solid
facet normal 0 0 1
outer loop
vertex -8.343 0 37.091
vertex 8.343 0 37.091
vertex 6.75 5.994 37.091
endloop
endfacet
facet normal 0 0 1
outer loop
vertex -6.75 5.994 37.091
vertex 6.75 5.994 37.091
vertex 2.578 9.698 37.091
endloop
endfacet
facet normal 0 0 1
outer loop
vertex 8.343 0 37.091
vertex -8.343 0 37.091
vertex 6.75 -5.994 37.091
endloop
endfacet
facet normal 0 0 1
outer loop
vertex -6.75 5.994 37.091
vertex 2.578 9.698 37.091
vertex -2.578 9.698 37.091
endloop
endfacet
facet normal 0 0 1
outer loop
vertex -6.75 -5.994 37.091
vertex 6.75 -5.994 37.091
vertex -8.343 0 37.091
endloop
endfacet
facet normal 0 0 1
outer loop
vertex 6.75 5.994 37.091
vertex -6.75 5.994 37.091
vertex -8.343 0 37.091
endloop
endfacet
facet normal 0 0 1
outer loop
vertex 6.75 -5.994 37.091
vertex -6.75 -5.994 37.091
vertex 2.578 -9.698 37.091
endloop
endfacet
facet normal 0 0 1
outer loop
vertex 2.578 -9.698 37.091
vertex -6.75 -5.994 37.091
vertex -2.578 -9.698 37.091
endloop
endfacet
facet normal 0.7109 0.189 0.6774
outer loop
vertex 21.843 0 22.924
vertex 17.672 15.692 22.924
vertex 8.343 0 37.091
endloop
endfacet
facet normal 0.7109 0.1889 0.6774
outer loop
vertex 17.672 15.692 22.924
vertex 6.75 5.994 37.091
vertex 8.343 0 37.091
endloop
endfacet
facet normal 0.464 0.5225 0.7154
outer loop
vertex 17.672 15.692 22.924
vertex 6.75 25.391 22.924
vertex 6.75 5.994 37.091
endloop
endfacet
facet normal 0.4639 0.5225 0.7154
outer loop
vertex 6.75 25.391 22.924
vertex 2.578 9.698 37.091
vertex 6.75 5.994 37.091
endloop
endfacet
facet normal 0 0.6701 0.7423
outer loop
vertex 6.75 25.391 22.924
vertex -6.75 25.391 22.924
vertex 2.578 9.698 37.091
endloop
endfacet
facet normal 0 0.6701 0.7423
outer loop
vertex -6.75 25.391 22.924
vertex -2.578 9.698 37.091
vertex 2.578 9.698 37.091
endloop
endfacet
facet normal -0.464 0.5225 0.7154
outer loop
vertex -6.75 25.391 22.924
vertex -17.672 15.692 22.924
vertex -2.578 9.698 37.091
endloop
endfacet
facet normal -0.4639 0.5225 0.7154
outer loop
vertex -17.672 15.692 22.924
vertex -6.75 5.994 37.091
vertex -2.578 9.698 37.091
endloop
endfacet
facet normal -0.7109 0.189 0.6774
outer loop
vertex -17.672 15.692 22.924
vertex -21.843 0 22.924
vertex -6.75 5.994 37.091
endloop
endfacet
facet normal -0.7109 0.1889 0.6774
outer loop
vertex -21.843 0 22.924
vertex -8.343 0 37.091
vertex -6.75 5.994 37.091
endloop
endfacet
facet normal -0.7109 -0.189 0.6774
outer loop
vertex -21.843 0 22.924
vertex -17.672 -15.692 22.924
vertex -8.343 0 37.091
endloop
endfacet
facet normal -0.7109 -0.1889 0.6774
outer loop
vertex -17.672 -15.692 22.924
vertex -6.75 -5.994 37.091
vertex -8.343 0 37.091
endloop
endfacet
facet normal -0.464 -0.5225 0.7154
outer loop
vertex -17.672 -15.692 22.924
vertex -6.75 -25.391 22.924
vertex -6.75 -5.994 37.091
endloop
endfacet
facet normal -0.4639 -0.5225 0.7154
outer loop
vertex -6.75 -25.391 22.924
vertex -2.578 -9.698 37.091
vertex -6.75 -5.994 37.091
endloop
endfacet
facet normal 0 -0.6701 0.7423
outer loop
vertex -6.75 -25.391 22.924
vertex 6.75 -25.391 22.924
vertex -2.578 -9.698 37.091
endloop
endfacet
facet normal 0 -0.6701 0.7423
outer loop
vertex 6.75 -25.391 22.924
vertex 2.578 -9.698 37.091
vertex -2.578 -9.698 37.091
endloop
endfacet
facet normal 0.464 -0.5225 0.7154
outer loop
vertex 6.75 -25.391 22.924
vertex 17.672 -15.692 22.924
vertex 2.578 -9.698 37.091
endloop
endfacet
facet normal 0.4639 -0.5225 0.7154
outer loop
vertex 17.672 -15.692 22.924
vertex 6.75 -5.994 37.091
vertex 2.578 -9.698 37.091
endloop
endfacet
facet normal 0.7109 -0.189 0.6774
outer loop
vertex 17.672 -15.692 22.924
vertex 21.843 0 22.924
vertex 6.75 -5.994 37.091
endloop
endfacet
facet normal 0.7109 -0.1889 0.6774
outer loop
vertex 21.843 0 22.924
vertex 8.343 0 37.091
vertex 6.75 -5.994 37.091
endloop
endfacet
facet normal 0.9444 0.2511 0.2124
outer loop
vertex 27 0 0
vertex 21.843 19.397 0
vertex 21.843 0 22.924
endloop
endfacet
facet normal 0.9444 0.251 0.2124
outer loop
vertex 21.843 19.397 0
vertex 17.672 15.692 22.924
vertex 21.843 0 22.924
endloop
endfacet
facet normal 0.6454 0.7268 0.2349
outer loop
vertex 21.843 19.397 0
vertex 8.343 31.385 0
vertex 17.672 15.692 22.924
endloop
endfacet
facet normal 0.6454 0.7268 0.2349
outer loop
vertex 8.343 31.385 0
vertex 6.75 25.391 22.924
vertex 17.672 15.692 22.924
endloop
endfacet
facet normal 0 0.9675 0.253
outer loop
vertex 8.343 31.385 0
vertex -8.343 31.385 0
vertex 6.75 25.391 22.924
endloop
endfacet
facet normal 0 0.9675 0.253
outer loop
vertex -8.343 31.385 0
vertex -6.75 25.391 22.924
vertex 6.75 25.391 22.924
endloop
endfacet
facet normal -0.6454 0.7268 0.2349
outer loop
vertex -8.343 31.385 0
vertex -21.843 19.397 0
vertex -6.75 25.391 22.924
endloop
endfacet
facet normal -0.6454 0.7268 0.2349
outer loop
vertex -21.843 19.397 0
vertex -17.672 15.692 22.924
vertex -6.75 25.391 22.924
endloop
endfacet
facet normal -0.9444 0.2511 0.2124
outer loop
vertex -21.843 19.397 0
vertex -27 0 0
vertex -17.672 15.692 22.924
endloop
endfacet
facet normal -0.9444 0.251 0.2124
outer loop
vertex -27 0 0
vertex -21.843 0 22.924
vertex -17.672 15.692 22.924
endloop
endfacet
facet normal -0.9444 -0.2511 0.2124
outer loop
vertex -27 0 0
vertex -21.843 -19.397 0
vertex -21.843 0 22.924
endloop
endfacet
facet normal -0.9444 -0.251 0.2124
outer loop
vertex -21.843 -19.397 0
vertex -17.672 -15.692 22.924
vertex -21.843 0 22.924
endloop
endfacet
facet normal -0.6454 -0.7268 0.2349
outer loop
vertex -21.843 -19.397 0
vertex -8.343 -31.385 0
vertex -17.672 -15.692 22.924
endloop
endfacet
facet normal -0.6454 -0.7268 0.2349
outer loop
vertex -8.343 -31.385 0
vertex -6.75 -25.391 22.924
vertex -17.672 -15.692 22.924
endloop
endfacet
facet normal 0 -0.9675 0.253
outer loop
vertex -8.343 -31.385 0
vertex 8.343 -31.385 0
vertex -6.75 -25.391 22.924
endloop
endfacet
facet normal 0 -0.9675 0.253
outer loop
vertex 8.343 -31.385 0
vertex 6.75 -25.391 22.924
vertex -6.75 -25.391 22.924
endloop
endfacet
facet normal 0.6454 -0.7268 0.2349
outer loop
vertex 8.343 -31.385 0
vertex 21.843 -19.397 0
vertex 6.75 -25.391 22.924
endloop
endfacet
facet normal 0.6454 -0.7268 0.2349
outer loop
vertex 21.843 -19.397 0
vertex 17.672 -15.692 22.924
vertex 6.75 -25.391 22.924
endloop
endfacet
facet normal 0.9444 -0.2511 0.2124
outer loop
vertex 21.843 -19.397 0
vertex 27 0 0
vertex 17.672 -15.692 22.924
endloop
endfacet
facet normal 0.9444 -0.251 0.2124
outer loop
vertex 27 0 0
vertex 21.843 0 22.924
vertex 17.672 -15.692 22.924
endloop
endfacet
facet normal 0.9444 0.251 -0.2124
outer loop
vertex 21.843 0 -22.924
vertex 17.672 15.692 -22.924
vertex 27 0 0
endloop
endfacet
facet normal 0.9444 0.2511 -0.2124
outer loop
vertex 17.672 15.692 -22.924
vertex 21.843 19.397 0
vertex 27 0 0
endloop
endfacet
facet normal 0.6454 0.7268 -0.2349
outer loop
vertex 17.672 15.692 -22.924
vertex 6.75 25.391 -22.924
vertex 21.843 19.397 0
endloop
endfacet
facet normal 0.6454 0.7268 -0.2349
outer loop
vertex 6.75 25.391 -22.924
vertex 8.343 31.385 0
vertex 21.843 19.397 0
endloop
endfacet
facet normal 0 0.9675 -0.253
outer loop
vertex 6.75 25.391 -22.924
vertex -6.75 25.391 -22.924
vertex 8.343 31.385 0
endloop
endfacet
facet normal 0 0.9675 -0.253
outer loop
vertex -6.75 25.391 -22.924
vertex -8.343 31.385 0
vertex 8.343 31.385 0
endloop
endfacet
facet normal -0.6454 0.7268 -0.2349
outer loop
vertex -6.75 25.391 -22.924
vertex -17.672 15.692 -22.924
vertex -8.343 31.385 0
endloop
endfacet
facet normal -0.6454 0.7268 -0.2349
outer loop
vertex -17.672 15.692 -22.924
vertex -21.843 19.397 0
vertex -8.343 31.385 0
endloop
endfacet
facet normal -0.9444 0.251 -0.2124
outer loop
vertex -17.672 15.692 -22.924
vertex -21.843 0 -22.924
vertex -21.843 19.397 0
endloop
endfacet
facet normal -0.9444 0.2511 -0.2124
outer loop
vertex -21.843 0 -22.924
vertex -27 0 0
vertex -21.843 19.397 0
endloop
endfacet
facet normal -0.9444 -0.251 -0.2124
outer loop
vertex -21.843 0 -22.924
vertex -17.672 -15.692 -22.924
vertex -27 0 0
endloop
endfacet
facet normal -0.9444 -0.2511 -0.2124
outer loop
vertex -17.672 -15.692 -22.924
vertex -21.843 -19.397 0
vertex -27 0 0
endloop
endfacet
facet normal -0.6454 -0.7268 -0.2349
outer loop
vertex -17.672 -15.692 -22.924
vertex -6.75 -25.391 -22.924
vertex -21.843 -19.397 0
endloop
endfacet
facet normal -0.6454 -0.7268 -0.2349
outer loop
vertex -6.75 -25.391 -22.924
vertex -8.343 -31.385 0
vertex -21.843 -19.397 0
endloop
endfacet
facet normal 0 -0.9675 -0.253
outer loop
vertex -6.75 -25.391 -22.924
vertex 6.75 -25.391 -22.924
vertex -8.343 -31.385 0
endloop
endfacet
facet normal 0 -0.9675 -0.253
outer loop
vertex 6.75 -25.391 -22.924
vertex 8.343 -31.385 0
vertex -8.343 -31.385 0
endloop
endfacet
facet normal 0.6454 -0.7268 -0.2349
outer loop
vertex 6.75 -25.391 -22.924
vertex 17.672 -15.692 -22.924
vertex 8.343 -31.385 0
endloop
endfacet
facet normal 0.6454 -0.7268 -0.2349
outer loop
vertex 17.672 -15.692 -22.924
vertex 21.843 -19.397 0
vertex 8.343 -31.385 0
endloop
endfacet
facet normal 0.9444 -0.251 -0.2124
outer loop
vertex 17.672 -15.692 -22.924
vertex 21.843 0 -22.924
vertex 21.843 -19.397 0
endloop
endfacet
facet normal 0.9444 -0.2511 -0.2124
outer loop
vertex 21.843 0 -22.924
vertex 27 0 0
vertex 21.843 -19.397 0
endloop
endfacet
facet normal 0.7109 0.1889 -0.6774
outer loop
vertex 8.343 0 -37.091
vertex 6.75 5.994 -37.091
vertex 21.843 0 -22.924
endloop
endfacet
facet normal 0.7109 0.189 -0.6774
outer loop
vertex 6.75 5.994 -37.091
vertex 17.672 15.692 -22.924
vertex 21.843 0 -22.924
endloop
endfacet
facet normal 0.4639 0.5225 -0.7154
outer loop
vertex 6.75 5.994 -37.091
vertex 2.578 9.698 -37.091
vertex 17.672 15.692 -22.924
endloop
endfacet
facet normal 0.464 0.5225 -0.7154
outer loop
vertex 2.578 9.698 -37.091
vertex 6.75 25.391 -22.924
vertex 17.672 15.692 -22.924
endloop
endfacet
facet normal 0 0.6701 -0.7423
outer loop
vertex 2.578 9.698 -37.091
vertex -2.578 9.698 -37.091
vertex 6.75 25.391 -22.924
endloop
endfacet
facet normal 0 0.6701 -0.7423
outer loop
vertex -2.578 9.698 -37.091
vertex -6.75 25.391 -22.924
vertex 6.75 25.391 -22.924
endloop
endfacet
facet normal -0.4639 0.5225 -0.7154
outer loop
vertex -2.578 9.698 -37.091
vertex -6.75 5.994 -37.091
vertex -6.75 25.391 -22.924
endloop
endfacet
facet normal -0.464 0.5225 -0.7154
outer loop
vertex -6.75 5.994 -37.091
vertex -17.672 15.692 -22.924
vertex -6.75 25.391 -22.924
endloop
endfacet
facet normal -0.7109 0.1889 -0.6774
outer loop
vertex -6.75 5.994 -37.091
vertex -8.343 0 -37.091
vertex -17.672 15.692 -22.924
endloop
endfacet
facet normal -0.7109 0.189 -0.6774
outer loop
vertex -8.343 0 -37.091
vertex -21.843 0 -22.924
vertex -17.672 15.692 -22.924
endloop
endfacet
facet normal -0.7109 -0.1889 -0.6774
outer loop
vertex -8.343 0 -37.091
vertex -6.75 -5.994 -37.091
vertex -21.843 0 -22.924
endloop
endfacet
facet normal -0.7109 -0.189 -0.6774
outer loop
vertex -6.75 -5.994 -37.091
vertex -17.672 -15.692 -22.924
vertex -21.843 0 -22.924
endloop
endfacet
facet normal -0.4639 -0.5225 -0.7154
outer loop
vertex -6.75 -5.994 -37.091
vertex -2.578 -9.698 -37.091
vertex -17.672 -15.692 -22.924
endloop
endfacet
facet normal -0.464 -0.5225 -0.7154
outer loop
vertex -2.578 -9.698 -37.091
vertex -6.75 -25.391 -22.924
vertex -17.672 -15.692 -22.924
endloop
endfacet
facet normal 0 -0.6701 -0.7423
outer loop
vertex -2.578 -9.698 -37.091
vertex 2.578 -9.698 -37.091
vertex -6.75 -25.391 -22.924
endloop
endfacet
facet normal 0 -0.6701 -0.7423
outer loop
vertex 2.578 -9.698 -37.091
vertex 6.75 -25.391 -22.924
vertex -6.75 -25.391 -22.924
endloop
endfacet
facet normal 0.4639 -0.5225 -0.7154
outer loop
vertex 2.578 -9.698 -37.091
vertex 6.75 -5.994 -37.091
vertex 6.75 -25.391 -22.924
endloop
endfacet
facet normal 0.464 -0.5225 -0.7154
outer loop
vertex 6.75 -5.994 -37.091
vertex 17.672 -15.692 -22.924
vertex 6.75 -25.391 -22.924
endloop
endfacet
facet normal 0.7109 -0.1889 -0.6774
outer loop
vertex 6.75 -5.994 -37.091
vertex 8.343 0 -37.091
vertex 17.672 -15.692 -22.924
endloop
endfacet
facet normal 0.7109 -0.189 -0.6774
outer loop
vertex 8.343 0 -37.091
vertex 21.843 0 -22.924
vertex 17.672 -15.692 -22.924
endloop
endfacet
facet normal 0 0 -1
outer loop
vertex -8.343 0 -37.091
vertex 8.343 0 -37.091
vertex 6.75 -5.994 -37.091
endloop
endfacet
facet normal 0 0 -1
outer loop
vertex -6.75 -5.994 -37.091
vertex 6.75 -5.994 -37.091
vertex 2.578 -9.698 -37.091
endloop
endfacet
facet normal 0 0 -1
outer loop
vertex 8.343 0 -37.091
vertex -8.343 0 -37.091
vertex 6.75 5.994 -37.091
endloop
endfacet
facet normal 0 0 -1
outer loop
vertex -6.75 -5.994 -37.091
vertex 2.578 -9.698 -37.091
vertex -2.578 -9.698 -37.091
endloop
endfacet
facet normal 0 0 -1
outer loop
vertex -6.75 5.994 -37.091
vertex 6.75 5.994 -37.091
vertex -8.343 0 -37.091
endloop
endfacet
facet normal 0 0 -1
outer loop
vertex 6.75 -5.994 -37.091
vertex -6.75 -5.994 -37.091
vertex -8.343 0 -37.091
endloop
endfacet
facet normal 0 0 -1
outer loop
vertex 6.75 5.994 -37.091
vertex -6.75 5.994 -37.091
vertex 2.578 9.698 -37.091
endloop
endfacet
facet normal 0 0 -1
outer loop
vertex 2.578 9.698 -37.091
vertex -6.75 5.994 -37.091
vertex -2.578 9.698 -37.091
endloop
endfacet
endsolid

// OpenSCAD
// Generated by SolidPython 1.0.1 on 2020-07-29 00:46:48


scale(v = [9, 11, 13]) {
	sphere(r = 3);
}
/***********************************************
*********      SolidPython code:      **********
************************************************
 
# import packages: SolidPython
from solid import *
from solid.utils import *
from itertools import chain, combinations, permutations


class Resize:

    def __init__(self, scad_file):
        self.scad_file = scad_file
        #self.scad_file = import_scad(scad_file)
        # cone/cylinder param:
        self.r1 = 0
        self.r2 = 0
        self.h = 0
        # rectangular prism param:
        self.w = 0
        self.l = 0
        # ellipse param:
        self.r = 0

    # import OpenScad code (file name corresponds to shape)


    # classify shape + parameters
    def assign(self, param1, param2, param3):
        if self.scad_file == 'cone.scad':
            self.r1 = param1
            self.r2 = param2
            self.h = param3
        elif self.scad_file == 'cylinder.scad':
            self.r1 = param1
            self.r2 = param2
            self.h = param3
        elif self.scad_file == 'rectangularPrism.scad':
            self.h = param1
            self.l = param2
            self.w = param3
        else:
            self.r = param1
            self.h = param2

    # resize parameters
    def iterate(self):
        x = range(3, 20, 2)
        i = 1
        if self.scad_file == 'cone.scad':
            tempList = list(permutations(x, 2))
            for temp in tempList:
                param1 = temp[0]
                param2 = temp[1]
                filepath = 'produced_scad_files/' + 'cone' + str(param1) + '_' + str(param2) + '_' + '.scad'
                scad_render_to_file(cylinder(h=param1, r1=param2, r2=0), filepath)

        elif self.scad_file == 'cylinder.scad':
            tempList = list(permutations(x, 3))
            for temp in tempList:
                param1 = temp[0]
                param2 = temp[1]
                filepath = 'produced_scad_files/' + 'cylinder' + str(param1) + '_' + str(param2) + '_' + '.scad'
                scad_render_to_file(cylinder(h=param1, r1=param2, r2=param2), filepath)

        elif self.scad_file == 'rectangularPrism.scad':
            tempList = list(permutations(x, 3))
            for temp in tempList:
                param1 = temp[0]
                param2 = temp[1]
                param3 = temp[2]
                filepath = 'produced_scad_files/' + 'rectangularPrism' + str(param1) + '_' + str(param2) + '_' + str(
                    param3) + '.scad'
                scad_render_to_file(cube(size=(param1, param2, param3)), filepath)

        elif self.scad_file == 'ellipse.scad':
            tempList = list(permutations(x, 4))
            for temp in tempList:
                param1 = temp[0]
                param2 = temp[1]
                param3 = temp[2]
                param4 = temp[3]
                filepath = 'produced_scad_files/' + 'ellipse' + str(param1) + '_' + str(param2) + '_' + str(param3) + '_' + str(param4) + '.scad'
                scad_render_to_file(scale([param1, param2, param3])(sphere(r=param4)), filepath)

    def render_to_scadfile(self):
        scad_render_to_file(scad, 'example.scad') 
 
************************************************/
